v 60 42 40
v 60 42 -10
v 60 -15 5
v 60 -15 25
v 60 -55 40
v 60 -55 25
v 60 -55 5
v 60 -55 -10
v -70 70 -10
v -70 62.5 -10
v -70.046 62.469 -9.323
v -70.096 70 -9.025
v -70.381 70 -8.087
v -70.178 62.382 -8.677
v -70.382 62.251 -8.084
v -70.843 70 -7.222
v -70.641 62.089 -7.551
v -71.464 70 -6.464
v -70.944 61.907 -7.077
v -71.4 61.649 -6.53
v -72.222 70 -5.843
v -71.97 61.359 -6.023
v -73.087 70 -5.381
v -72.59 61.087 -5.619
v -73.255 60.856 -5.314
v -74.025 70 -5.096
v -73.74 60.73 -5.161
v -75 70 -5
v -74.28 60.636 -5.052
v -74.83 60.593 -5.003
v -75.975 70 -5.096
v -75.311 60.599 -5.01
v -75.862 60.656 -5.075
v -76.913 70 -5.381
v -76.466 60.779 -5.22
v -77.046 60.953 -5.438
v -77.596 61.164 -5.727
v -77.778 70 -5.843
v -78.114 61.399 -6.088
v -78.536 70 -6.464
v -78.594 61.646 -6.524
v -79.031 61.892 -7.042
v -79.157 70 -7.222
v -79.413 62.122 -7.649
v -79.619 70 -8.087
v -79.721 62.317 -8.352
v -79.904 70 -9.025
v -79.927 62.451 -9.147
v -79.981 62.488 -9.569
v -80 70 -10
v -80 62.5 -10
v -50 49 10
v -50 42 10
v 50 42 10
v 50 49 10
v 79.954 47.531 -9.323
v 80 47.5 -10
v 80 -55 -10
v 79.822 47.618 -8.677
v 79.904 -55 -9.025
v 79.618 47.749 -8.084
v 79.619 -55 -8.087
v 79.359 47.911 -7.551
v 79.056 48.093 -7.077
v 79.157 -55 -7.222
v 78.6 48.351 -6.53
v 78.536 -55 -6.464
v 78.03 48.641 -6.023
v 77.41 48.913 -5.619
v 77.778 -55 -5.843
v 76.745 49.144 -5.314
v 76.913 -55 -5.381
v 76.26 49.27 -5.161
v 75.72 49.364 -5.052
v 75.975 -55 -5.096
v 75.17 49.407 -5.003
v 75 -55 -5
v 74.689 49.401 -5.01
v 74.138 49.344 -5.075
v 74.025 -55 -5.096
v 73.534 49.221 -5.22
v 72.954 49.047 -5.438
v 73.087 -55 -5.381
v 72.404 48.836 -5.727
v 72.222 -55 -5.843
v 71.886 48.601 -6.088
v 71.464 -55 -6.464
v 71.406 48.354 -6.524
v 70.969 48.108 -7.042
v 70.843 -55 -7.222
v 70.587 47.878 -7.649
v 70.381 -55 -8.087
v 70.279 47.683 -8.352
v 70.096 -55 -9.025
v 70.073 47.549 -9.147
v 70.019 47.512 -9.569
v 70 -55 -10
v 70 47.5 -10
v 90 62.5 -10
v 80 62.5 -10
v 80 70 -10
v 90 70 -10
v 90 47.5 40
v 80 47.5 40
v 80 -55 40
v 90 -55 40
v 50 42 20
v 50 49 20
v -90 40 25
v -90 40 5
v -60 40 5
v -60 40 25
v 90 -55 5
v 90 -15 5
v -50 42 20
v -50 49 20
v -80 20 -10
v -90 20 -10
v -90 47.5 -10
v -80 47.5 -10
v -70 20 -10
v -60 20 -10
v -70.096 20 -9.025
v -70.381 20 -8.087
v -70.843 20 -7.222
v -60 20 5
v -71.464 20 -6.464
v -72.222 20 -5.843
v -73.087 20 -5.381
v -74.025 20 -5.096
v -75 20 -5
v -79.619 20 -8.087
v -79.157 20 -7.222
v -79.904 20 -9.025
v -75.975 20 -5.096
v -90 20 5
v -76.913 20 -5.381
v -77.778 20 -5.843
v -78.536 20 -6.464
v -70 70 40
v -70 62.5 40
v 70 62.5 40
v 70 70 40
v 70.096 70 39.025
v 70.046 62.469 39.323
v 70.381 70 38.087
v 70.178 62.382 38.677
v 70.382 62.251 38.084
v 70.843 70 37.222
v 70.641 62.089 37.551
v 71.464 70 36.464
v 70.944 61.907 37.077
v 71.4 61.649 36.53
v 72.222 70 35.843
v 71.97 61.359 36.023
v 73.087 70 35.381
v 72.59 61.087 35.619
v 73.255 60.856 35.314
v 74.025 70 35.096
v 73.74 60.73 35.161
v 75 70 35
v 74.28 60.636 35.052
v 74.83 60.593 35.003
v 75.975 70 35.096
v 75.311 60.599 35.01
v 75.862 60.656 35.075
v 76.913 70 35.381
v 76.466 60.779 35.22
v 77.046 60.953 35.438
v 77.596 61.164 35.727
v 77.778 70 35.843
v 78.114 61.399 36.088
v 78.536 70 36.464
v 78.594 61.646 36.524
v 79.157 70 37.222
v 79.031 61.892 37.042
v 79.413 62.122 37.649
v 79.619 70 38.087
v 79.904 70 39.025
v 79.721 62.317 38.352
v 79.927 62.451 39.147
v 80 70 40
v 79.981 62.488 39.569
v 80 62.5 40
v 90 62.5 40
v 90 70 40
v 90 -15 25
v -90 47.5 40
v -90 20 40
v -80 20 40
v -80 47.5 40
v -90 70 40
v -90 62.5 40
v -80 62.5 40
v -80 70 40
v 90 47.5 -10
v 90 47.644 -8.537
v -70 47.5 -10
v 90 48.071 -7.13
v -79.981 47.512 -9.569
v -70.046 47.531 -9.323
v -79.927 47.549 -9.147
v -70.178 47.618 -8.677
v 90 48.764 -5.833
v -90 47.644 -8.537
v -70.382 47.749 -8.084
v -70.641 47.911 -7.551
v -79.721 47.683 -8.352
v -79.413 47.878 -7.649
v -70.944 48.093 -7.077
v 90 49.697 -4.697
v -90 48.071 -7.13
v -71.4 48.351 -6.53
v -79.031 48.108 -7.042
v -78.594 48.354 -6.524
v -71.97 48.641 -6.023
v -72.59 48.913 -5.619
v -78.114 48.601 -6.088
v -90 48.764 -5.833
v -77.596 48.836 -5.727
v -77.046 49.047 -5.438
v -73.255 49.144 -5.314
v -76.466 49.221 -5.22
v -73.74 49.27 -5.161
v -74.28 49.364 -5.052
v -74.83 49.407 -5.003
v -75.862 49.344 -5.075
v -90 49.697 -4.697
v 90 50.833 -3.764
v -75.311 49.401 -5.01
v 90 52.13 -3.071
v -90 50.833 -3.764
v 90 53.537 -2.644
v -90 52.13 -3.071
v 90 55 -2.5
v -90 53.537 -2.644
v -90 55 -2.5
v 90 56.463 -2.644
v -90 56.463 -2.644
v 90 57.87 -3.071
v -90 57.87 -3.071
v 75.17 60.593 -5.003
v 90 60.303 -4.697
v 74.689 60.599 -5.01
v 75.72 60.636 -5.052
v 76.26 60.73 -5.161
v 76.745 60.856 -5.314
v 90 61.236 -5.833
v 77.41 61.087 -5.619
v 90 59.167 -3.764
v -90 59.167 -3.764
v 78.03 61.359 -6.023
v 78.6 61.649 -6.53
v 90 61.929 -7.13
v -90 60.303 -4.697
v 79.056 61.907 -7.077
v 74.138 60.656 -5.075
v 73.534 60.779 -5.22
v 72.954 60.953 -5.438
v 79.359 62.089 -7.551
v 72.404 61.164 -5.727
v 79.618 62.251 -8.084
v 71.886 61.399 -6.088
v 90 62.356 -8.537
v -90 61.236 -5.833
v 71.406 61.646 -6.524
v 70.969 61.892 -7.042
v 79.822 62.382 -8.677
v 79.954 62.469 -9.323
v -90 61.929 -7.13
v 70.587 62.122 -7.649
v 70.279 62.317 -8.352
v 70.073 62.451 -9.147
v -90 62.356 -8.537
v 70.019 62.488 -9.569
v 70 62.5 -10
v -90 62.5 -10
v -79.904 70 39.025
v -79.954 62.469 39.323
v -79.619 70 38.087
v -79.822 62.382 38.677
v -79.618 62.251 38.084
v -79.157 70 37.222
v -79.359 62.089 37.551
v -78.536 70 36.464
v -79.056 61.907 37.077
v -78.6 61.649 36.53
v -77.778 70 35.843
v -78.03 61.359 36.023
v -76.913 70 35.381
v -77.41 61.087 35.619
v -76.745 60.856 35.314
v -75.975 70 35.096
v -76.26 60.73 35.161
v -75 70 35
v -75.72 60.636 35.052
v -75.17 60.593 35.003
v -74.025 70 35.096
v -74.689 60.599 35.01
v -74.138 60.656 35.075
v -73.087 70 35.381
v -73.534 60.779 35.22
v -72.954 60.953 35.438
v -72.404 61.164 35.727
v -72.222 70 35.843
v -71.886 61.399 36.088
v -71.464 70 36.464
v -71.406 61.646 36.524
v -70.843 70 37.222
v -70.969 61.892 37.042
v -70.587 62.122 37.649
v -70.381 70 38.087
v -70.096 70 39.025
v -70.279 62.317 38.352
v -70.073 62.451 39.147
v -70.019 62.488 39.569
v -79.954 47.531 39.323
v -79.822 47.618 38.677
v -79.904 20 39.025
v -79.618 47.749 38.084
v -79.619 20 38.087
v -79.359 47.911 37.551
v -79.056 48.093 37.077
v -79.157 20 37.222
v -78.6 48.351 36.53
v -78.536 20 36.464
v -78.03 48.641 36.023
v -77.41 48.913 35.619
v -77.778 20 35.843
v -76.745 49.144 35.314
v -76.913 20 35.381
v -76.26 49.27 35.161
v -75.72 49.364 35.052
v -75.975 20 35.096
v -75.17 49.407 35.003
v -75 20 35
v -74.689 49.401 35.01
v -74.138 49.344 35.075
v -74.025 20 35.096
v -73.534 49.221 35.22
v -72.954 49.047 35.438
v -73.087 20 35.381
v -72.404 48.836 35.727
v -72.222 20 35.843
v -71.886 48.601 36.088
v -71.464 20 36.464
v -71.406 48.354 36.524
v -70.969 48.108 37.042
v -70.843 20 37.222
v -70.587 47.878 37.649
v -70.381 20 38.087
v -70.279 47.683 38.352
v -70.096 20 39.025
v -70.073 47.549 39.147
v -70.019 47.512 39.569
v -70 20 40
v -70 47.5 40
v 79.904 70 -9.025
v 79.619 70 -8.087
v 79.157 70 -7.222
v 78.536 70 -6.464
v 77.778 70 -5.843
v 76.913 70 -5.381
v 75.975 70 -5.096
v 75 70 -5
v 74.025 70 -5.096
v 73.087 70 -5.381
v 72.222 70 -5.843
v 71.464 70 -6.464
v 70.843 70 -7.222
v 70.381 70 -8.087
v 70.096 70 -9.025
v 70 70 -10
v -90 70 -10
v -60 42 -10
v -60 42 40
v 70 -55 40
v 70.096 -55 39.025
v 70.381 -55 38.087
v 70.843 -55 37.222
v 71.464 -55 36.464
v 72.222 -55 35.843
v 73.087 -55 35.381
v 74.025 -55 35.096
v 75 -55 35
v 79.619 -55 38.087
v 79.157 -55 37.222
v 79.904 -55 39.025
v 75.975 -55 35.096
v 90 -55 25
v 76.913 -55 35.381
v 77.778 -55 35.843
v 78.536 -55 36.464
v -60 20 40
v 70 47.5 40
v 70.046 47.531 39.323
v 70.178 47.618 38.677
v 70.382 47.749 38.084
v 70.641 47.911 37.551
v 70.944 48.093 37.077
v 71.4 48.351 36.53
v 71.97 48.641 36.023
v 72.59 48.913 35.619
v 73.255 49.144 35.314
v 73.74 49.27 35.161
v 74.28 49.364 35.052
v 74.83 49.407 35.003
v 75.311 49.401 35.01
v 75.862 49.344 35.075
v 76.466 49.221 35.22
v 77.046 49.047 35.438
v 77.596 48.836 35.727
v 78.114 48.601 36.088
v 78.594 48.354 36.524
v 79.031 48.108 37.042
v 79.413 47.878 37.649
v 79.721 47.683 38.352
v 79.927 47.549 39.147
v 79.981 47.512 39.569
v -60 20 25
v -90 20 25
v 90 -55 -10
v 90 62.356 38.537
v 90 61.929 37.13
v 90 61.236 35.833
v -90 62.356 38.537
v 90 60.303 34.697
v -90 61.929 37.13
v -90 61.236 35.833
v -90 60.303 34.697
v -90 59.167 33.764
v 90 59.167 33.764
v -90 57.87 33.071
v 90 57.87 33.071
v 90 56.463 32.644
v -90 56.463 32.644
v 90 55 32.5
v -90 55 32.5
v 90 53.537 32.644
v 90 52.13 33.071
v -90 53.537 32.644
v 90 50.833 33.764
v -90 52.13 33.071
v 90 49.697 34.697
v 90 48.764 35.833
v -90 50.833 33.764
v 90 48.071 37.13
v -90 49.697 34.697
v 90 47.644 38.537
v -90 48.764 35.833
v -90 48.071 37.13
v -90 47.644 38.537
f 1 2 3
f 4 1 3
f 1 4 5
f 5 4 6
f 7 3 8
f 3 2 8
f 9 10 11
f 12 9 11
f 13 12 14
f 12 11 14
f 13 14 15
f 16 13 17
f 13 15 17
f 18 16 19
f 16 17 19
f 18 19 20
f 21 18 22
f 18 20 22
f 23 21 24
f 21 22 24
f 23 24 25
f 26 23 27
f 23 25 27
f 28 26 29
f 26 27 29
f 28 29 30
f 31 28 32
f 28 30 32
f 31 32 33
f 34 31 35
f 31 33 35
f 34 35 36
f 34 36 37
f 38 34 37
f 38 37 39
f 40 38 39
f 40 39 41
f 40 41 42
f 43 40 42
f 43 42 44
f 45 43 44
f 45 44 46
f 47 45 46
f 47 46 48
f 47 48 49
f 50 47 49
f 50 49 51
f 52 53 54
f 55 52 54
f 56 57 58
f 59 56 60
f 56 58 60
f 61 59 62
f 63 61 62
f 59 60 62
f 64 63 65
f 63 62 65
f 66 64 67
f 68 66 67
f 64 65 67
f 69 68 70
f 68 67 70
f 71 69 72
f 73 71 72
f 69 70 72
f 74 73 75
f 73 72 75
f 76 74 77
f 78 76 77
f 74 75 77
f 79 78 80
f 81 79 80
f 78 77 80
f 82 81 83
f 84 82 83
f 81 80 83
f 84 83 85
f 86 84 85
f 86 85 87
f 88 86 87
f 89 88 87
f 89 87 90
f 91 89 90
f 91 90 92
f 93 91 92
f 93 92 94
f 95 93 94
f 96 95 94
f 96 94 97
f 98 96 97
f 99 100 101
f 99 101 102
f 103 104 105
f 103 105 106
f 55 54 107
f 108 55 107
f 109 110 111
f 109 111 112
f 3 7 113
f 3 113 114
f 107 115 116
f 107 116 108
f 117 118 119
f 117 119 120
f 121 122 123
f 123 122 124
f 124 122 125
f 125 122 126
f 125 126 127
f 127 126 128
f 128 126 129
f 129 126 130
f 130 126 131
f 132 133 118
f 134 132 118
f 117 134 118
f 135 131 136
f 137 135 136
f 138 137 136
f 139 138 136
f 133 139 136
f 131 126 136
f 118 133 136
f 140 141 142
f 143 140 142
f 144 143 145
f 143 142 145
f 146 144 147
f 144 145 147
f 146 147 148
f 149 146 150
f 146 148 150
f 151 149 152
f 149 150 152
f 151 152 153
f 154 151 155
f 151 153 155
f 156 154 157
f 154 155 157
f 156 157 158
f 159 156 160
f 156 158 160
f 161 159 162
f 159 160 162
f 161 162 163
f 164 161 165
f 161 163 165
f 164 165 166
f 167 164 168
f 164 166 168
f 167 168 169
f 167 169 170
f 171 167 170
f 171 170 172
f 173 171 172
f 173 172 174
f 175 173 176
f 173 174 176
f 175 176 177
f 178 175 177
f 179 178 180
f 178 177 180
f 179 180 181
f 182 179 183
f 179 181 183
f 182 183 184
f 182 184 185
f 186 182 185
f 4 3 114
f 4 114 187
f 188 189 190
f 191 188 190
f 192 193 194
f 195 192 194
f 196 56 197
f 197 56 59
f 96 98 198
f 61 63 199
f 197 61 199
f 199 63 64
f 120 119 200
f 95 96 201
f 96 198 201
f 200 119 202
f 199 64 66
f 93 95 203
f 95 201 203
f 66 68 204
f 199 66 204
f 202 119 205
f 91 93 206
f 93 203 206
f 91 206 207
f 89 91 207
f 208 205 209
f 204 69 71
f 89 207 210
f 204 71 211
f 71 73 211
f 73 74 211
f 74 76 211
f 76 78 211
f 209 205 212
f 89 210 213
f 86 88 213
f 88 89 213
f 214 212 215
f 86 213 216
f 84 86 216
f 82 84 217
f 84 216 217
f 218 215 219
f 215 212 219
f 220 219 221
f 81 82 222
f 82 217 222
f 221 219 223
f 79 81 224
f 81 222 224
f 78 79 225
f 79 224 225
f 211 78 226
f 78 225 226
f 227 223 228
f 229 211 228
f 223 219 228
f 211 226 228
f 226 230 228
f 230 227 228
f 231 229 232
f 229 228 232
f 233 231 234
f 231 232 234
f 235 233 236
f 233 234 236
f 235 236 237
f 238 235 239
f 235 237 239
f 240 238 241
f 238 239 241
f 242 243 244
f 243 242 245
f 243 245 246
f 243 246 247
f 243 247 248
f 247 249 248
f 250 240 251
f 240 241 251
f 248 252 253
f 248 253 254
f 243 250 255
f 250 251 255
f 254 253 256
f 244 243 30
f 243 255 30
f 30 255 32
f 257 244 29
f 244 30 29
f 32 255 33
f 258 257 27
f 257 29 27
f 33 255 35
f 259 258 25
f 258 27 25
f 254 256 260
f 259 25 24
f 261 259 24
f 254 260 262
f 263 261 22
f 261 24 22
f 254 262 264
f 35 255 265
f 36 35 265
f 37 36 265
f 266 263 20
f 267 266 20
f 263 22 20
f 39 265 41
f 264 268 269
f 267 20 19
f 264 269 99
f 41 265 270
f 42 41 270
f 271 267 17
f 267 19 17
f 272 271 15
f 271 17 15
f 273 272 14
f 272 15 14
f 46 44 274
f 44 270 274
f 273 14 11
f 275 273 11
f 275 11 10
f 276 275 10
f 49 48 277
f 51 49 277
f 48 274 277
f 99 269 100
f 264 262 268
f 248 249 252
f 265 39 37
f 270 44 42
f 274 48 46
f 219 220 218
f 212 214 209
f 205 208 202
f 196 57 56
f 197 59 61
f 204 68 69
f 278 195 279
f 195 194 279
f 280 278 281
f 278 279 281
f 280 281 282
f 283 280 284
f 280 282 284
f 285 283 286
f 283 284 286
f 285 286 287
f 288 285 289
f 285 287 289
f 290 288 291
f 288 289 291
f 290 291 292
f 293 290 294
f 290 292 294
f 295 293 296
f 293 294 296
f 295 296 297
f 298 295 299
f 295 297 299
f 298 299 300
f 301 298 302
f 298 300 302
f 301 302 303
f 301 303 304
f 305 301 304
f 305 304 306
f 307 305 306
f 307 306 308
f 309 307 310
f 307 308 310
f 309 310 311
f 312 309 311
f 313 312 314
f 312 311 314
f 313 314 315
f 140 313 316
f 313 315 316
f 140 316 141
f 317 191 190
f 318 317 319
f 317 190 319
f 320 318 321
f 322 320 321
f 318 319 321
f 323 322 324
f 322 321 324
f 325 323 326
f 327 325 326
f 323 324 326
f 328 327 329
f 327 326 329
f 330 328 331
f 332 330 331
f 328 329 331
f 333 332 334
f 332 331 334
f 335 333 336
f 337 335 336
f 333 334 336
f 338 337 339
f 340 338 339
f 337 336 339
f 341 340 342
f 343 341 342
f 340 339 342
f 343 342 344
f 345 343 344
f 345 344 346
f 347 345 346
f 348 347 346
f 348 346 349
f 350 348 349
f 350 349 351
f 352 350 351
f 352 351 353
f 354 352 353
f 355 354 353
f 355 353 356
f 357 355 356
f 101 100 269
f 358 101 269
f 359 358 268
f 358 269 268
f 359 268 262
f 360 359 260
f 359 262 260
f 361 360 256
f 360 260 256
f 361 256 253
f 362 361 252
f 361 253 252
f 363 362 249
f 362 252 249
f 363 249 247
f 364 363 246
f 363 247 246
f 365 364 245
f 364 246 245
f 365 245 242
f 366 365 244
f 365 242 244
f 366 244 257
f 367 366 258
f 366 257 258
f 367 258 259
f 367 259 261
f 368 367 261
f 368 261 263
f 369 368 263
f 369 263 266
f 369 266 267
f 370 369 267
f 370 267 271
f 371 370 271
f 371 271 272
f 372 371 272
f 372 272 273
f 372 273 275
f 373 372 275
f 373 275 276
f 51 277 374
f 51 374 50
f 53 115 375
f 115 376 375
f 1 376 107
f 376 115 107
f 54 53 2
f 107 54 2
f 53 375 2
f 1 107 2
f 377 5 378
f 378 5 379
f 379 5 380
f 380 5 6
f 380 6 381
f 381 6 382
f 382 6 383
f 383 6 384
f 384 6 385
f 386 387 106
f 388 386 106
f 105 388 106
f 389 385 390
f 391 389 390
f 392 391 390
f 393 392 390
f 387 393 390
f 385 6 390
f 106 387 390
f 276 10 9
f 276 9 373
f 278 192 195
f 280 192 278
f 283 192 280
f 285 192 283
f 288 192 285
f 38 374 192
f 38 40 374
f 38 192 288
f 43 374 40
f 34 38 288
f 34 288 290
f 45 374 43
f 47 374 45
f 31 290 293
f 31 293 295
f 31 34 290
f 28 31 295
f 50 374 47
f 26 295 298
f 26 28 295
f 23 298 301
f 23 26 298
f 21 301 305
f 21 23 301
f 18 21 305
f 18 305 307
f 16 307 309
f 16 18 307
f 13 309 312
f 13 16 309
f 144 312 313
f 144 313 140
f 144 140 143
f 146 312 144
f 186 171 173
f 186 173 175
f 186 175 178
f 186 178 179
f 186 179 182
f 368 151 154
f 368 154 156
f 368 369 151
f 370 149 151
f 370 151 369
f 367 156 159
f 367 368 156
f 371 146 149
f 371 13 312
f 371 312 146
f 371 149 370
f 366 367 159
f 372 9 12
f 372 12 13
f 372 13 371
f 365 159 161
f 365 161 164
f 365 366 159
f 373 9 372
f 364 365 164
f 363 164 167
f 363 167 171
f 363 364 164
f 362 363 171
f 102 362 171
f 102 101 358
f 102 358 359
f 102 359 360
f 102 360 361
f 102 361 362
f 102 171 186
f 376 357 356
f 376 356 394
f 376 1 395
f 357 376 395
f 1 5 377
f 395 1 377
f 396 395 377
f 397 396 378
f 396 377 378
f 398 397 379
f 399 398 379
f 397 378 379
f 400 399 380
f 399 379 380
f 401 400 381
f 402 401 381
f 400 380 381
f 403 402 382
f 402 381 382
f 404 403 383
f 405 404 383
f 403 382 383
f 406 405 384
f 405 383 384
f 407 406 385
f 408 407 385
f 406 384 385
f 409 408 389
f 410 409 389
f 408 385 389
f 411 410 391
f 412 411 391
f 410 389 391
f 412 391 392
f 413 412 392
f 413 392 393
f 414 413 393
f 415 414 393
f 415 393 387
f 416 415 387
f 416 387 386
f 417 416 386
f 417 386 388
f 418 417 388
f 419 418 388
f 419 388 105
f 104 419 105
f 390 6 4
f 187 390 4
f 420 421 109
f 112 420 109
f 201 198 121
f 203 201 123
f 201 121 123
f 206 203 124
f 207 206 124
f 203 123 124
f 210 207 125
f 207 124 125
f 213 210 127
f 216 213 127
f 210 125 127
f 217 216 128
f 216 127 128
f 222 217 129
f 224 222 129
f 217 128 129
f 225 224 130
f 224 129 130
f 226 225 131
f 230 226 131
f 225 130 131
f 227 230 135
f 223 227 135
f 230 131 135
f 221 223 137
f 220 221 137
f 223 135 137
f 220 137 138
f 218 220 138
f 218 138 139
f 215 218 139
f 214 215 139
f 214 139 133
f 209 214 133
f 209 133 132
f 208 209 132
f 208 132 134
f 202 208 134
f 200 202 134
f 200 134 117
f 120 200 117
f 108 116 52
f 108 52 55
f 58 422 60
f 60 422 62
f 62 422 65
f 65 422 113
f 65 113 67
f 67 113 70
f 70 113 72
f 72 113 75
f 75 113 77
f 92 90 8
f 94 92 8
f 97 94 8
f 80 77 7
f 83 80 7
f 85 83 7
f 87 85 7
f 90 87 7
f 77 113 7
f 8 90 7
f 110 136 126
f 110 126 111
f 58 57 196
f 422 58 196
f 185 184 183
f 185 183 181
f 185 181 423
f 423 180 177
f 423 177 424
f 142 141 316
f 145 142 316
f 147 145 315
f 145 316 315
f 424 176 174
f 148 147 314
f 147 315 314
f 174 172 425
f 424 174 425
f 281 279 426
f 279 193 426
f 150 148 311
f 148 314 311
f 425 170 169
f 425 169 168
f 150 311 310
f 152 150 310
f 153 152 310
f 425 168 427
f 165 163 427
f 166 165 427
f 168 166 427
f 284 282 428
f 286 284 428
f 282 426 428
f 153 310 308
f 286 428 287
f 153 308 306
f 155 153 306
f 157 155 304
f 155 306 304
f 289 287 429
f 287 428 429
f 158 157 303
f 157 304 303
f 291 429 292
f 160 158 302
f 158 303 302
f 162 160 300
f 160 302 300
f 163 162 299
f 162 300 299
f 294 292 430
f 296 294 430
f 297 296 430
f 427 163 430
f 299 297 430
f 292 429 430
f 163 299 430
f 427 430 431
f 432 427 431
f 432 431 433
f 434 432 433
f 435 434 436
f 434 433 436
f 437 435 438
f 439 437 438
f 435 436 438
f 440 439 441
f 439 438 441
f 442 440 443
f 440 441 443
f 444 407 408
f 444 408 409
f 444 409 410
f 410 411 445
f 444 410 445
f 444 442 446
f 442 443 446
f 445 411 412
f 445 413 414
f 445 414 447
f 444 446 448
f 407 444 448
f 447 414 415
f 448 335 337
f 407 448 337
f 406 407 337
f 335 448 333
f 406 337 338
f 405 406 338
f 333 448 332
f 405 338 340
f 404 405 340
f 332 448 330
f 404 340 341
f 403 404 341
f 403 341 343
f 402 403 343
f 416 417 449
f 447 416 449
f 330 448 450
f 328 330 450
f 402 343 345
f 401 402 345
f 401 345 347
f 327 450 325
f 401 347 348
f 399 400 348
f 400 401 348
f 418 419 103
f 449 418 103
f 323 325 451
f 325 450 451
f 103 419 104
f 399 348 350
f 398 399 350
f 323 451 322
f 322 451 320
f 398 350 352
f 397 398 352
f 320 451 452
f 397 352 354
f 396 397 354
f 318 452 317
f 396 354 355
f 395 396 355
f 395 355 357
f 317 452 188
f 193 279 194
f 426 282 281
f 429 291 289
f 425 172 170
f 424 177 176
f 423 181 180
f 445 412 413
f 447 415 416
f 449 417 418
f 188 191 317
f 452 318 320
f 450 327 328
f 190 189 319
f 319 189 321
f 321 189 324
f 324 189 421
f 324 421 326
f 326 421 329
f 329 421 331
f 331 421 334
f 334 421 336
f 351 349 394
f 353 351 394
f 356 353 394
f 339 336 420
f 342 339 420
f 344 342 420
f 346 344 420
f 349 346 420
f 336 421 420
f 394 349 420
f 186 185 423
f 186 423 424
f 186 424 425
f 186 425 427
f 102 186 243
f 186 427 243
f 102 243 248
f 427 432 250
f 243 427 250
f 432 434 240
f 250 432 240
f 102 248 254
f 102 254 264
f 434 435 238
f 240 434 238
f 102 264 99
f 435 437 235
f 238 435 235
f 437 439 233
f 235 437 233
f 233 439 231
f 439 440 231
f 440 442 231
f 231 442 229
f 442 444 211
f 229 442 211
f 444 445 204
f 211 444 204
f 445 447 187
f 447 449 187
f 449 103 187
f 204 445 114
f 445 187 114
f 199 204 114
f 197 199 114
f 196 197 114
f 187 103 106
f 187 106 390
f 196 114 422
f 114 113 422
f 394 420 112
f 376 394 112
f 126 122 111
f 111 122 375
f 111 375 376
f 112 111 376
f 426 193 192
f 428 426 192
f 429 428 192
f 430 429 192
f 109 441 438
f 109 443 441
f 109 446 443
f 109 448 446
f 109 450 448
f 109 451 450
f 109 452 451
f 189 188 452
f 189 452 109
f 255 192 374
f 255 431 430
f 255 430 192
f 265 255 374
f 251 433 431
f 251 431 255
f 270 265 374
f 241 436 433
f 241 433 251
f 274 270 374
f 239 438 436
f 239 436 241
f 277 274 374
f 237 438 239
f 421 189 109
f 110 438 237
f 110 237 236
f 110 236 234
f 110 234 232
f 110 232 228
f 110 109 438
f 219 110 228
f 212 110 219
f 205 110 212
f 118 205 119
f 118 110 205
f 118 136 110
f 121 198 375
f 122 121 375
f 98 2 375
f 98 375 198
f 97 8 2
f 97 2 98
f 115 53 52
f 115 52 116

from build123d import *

# Parameters (mm, degrees)
SKETCH_1_W          = 180
SKETCH_1_H          = 110
EXTRUDE_1_DEPTH     = 30
SKETCH_2_W          = 150
SKETCH_2_H          = 75
CUT_EXTRUDE_1_DEPTH = 30
SKETCH_3_W          = 20
SKETCH_3_H          = 40
CUT_EXTRUDE_2_DEPTH = 150
SKETCH_4_W          = 20
SKETCH_4_H          = 80
CUT_EXTRUDE_3_DEPTH = 30
SKETCH_5_W          = 120
SKETCH_5_H          = 22
CUT_EXTRUDE_4_DEPTH = 30
SKETCH_6_W          = 100
SKETCH_6_H          = 10
CUT_EXTRUDE_5_DEPTH = 64
EXTRUDE_2_DEPTH     = 10
EXTRUDE_3_DEPTH     = 10
SKETCH_9_W          = 180
SKETCH_9_H          = 50
EXTRUDE_4_DEPTH     = 15
SKETCH_10_R         = 5
CUT_EXTRUDE_6_DEPTH = 144
SKETCH_11_R         = 7.5
CUT_EXTRUDE_7_DEPTH = 191


with BuildPart() as part:
    # 草图1 → 凸台-拉伸1 (new body)
    with BuildSketch(Plane.XY):
        Rectangle(SKETCH_1_W, SKETCH_1_H)
    extrude(amount=EXTRUDE_1_DEPTH)

    # 草图2 → 切除-拉伸1 (cut)
    with BuildSketch(Plane.XY.offset(30)):
        with Locations((-15, -17.5)):
            Rectangle(SKETCH_2_W, SKETCH_2_H)
    extrude(amount=-CUT_EXTRUDE_1_DEPTH, mode=Mode.SUBTRACT)

    # 草图3 → 切除-拉伸2 (cut)
    with BuildSketch(Plane.ZY.offset(90)):
        with Locations((15, 20)):
            Rectangle(SKETCH_3_W, SKETCH_3_H)
    extrude(amount=-CUT_EXTRUDE_2_DEPTH, mode=Mode.SUBTRACT)

    # 草图4 → 切除-拉伸3 (cut)
    with BuildSketch(Plane.ZY.offset(-60)):
        with Locations((15, -55)):
            Rectangle(SKETCH_4_W, SKETCH_4_H)
    extrude(amount=-CUT_EXTRUDE_3_DEPTH, mode=Mode.SUBTRACT)

    # 草图5 → 切除-拉伸4 (cut)
    with BuildSketch(Plane.XY.offset(30)):
        with Locations((0, 31)):
            Rectangle(SKETCH_5_W, SKETCH_5_H)
    extrude(amount=-CUT_EXTRUDE_4_DEPTH, mode=Mode.SUBTRACT)

    # 草图6 → 切除-拉伸5 (cut)
    with BuildSketch(Plane.XZ.offset(15)):
        with Locations((0, 15)):
            Rectangle(SKETCH_6_W, SKETCH_6_H)
    extrude(amount=-CUT_EXTRUDE_5_DEPTH, mode=Mode.SUBTRACT)

    # 草图7 → 凸台-拉伸2 (add)
    with BuildSketch(Plane(origin=(0, 0, 0), x_dir=(-1, 0, 0), z_dir=(0, 0, -1))):
        Polygon((-60, 42), (60, 42), (60, 20), (90, 20), (90, 55), (-90, 55), (-90, -55), (-60, -55), align=None)
    extrude(amount=EXTRUDE_2_DEPTH)

    # 草图8 → 凸台-拉伸3 (add)
    with BuildSketch(Plane.XY.offset(30)):
        Polygon((-60, 20), (-60, 42), (60, 42), (60, -55), (90, -55), (90, 55), (-90, 55), (-90, 20), align=None)
    extrude(amount=EXTRUDE_3_DEPTH)

    # 草图9 → 凸台-拉伸4 (add)
    with BuildSketch(Plane(origin=(0, 55, 0), x_dir=(1, 0, 0), z_dir=(0, 1, 0))):
        with Locations((0, -15)):
            Rectangle(SKETCH_9_W, SKETCH_9_H)
    extrude(amount=EXTRUDE_4_DEPTH)

    # 草图10 → 切除-拉伸6 (cut)
    with BuildSketch(Plane.XZ.offset(55)):
        with Locations((75, 40)):
            Circle(SKETCH_10_R)
        with Locations((75, -10)):
            Circle(SKETCH_10_R)
        with Locations((-75, 40)):
            Circle(SKETCH_10_R)
        with Locations((-75, -10)):
            Circle(SKETCH_10_R)
    extrude(amount=-CUT_EXTRUDE_6_DEPTH, mode=Mode.SUBTRACT)

    # 草图11 → 切除-拉伸7 (cut)
    with BuildSketch(Plane.ZY.offset(90)):
        with Locations((40, 55)):
            Circle(SKETCH_11_R)
        with Locations((-10, 55)):
            Circle(SKETCH_11_R)
    extrude(amount=-CUT_EXTRUDE_7_DEPTH, mode=Mode.SUBTRACT)


solid = part.part
